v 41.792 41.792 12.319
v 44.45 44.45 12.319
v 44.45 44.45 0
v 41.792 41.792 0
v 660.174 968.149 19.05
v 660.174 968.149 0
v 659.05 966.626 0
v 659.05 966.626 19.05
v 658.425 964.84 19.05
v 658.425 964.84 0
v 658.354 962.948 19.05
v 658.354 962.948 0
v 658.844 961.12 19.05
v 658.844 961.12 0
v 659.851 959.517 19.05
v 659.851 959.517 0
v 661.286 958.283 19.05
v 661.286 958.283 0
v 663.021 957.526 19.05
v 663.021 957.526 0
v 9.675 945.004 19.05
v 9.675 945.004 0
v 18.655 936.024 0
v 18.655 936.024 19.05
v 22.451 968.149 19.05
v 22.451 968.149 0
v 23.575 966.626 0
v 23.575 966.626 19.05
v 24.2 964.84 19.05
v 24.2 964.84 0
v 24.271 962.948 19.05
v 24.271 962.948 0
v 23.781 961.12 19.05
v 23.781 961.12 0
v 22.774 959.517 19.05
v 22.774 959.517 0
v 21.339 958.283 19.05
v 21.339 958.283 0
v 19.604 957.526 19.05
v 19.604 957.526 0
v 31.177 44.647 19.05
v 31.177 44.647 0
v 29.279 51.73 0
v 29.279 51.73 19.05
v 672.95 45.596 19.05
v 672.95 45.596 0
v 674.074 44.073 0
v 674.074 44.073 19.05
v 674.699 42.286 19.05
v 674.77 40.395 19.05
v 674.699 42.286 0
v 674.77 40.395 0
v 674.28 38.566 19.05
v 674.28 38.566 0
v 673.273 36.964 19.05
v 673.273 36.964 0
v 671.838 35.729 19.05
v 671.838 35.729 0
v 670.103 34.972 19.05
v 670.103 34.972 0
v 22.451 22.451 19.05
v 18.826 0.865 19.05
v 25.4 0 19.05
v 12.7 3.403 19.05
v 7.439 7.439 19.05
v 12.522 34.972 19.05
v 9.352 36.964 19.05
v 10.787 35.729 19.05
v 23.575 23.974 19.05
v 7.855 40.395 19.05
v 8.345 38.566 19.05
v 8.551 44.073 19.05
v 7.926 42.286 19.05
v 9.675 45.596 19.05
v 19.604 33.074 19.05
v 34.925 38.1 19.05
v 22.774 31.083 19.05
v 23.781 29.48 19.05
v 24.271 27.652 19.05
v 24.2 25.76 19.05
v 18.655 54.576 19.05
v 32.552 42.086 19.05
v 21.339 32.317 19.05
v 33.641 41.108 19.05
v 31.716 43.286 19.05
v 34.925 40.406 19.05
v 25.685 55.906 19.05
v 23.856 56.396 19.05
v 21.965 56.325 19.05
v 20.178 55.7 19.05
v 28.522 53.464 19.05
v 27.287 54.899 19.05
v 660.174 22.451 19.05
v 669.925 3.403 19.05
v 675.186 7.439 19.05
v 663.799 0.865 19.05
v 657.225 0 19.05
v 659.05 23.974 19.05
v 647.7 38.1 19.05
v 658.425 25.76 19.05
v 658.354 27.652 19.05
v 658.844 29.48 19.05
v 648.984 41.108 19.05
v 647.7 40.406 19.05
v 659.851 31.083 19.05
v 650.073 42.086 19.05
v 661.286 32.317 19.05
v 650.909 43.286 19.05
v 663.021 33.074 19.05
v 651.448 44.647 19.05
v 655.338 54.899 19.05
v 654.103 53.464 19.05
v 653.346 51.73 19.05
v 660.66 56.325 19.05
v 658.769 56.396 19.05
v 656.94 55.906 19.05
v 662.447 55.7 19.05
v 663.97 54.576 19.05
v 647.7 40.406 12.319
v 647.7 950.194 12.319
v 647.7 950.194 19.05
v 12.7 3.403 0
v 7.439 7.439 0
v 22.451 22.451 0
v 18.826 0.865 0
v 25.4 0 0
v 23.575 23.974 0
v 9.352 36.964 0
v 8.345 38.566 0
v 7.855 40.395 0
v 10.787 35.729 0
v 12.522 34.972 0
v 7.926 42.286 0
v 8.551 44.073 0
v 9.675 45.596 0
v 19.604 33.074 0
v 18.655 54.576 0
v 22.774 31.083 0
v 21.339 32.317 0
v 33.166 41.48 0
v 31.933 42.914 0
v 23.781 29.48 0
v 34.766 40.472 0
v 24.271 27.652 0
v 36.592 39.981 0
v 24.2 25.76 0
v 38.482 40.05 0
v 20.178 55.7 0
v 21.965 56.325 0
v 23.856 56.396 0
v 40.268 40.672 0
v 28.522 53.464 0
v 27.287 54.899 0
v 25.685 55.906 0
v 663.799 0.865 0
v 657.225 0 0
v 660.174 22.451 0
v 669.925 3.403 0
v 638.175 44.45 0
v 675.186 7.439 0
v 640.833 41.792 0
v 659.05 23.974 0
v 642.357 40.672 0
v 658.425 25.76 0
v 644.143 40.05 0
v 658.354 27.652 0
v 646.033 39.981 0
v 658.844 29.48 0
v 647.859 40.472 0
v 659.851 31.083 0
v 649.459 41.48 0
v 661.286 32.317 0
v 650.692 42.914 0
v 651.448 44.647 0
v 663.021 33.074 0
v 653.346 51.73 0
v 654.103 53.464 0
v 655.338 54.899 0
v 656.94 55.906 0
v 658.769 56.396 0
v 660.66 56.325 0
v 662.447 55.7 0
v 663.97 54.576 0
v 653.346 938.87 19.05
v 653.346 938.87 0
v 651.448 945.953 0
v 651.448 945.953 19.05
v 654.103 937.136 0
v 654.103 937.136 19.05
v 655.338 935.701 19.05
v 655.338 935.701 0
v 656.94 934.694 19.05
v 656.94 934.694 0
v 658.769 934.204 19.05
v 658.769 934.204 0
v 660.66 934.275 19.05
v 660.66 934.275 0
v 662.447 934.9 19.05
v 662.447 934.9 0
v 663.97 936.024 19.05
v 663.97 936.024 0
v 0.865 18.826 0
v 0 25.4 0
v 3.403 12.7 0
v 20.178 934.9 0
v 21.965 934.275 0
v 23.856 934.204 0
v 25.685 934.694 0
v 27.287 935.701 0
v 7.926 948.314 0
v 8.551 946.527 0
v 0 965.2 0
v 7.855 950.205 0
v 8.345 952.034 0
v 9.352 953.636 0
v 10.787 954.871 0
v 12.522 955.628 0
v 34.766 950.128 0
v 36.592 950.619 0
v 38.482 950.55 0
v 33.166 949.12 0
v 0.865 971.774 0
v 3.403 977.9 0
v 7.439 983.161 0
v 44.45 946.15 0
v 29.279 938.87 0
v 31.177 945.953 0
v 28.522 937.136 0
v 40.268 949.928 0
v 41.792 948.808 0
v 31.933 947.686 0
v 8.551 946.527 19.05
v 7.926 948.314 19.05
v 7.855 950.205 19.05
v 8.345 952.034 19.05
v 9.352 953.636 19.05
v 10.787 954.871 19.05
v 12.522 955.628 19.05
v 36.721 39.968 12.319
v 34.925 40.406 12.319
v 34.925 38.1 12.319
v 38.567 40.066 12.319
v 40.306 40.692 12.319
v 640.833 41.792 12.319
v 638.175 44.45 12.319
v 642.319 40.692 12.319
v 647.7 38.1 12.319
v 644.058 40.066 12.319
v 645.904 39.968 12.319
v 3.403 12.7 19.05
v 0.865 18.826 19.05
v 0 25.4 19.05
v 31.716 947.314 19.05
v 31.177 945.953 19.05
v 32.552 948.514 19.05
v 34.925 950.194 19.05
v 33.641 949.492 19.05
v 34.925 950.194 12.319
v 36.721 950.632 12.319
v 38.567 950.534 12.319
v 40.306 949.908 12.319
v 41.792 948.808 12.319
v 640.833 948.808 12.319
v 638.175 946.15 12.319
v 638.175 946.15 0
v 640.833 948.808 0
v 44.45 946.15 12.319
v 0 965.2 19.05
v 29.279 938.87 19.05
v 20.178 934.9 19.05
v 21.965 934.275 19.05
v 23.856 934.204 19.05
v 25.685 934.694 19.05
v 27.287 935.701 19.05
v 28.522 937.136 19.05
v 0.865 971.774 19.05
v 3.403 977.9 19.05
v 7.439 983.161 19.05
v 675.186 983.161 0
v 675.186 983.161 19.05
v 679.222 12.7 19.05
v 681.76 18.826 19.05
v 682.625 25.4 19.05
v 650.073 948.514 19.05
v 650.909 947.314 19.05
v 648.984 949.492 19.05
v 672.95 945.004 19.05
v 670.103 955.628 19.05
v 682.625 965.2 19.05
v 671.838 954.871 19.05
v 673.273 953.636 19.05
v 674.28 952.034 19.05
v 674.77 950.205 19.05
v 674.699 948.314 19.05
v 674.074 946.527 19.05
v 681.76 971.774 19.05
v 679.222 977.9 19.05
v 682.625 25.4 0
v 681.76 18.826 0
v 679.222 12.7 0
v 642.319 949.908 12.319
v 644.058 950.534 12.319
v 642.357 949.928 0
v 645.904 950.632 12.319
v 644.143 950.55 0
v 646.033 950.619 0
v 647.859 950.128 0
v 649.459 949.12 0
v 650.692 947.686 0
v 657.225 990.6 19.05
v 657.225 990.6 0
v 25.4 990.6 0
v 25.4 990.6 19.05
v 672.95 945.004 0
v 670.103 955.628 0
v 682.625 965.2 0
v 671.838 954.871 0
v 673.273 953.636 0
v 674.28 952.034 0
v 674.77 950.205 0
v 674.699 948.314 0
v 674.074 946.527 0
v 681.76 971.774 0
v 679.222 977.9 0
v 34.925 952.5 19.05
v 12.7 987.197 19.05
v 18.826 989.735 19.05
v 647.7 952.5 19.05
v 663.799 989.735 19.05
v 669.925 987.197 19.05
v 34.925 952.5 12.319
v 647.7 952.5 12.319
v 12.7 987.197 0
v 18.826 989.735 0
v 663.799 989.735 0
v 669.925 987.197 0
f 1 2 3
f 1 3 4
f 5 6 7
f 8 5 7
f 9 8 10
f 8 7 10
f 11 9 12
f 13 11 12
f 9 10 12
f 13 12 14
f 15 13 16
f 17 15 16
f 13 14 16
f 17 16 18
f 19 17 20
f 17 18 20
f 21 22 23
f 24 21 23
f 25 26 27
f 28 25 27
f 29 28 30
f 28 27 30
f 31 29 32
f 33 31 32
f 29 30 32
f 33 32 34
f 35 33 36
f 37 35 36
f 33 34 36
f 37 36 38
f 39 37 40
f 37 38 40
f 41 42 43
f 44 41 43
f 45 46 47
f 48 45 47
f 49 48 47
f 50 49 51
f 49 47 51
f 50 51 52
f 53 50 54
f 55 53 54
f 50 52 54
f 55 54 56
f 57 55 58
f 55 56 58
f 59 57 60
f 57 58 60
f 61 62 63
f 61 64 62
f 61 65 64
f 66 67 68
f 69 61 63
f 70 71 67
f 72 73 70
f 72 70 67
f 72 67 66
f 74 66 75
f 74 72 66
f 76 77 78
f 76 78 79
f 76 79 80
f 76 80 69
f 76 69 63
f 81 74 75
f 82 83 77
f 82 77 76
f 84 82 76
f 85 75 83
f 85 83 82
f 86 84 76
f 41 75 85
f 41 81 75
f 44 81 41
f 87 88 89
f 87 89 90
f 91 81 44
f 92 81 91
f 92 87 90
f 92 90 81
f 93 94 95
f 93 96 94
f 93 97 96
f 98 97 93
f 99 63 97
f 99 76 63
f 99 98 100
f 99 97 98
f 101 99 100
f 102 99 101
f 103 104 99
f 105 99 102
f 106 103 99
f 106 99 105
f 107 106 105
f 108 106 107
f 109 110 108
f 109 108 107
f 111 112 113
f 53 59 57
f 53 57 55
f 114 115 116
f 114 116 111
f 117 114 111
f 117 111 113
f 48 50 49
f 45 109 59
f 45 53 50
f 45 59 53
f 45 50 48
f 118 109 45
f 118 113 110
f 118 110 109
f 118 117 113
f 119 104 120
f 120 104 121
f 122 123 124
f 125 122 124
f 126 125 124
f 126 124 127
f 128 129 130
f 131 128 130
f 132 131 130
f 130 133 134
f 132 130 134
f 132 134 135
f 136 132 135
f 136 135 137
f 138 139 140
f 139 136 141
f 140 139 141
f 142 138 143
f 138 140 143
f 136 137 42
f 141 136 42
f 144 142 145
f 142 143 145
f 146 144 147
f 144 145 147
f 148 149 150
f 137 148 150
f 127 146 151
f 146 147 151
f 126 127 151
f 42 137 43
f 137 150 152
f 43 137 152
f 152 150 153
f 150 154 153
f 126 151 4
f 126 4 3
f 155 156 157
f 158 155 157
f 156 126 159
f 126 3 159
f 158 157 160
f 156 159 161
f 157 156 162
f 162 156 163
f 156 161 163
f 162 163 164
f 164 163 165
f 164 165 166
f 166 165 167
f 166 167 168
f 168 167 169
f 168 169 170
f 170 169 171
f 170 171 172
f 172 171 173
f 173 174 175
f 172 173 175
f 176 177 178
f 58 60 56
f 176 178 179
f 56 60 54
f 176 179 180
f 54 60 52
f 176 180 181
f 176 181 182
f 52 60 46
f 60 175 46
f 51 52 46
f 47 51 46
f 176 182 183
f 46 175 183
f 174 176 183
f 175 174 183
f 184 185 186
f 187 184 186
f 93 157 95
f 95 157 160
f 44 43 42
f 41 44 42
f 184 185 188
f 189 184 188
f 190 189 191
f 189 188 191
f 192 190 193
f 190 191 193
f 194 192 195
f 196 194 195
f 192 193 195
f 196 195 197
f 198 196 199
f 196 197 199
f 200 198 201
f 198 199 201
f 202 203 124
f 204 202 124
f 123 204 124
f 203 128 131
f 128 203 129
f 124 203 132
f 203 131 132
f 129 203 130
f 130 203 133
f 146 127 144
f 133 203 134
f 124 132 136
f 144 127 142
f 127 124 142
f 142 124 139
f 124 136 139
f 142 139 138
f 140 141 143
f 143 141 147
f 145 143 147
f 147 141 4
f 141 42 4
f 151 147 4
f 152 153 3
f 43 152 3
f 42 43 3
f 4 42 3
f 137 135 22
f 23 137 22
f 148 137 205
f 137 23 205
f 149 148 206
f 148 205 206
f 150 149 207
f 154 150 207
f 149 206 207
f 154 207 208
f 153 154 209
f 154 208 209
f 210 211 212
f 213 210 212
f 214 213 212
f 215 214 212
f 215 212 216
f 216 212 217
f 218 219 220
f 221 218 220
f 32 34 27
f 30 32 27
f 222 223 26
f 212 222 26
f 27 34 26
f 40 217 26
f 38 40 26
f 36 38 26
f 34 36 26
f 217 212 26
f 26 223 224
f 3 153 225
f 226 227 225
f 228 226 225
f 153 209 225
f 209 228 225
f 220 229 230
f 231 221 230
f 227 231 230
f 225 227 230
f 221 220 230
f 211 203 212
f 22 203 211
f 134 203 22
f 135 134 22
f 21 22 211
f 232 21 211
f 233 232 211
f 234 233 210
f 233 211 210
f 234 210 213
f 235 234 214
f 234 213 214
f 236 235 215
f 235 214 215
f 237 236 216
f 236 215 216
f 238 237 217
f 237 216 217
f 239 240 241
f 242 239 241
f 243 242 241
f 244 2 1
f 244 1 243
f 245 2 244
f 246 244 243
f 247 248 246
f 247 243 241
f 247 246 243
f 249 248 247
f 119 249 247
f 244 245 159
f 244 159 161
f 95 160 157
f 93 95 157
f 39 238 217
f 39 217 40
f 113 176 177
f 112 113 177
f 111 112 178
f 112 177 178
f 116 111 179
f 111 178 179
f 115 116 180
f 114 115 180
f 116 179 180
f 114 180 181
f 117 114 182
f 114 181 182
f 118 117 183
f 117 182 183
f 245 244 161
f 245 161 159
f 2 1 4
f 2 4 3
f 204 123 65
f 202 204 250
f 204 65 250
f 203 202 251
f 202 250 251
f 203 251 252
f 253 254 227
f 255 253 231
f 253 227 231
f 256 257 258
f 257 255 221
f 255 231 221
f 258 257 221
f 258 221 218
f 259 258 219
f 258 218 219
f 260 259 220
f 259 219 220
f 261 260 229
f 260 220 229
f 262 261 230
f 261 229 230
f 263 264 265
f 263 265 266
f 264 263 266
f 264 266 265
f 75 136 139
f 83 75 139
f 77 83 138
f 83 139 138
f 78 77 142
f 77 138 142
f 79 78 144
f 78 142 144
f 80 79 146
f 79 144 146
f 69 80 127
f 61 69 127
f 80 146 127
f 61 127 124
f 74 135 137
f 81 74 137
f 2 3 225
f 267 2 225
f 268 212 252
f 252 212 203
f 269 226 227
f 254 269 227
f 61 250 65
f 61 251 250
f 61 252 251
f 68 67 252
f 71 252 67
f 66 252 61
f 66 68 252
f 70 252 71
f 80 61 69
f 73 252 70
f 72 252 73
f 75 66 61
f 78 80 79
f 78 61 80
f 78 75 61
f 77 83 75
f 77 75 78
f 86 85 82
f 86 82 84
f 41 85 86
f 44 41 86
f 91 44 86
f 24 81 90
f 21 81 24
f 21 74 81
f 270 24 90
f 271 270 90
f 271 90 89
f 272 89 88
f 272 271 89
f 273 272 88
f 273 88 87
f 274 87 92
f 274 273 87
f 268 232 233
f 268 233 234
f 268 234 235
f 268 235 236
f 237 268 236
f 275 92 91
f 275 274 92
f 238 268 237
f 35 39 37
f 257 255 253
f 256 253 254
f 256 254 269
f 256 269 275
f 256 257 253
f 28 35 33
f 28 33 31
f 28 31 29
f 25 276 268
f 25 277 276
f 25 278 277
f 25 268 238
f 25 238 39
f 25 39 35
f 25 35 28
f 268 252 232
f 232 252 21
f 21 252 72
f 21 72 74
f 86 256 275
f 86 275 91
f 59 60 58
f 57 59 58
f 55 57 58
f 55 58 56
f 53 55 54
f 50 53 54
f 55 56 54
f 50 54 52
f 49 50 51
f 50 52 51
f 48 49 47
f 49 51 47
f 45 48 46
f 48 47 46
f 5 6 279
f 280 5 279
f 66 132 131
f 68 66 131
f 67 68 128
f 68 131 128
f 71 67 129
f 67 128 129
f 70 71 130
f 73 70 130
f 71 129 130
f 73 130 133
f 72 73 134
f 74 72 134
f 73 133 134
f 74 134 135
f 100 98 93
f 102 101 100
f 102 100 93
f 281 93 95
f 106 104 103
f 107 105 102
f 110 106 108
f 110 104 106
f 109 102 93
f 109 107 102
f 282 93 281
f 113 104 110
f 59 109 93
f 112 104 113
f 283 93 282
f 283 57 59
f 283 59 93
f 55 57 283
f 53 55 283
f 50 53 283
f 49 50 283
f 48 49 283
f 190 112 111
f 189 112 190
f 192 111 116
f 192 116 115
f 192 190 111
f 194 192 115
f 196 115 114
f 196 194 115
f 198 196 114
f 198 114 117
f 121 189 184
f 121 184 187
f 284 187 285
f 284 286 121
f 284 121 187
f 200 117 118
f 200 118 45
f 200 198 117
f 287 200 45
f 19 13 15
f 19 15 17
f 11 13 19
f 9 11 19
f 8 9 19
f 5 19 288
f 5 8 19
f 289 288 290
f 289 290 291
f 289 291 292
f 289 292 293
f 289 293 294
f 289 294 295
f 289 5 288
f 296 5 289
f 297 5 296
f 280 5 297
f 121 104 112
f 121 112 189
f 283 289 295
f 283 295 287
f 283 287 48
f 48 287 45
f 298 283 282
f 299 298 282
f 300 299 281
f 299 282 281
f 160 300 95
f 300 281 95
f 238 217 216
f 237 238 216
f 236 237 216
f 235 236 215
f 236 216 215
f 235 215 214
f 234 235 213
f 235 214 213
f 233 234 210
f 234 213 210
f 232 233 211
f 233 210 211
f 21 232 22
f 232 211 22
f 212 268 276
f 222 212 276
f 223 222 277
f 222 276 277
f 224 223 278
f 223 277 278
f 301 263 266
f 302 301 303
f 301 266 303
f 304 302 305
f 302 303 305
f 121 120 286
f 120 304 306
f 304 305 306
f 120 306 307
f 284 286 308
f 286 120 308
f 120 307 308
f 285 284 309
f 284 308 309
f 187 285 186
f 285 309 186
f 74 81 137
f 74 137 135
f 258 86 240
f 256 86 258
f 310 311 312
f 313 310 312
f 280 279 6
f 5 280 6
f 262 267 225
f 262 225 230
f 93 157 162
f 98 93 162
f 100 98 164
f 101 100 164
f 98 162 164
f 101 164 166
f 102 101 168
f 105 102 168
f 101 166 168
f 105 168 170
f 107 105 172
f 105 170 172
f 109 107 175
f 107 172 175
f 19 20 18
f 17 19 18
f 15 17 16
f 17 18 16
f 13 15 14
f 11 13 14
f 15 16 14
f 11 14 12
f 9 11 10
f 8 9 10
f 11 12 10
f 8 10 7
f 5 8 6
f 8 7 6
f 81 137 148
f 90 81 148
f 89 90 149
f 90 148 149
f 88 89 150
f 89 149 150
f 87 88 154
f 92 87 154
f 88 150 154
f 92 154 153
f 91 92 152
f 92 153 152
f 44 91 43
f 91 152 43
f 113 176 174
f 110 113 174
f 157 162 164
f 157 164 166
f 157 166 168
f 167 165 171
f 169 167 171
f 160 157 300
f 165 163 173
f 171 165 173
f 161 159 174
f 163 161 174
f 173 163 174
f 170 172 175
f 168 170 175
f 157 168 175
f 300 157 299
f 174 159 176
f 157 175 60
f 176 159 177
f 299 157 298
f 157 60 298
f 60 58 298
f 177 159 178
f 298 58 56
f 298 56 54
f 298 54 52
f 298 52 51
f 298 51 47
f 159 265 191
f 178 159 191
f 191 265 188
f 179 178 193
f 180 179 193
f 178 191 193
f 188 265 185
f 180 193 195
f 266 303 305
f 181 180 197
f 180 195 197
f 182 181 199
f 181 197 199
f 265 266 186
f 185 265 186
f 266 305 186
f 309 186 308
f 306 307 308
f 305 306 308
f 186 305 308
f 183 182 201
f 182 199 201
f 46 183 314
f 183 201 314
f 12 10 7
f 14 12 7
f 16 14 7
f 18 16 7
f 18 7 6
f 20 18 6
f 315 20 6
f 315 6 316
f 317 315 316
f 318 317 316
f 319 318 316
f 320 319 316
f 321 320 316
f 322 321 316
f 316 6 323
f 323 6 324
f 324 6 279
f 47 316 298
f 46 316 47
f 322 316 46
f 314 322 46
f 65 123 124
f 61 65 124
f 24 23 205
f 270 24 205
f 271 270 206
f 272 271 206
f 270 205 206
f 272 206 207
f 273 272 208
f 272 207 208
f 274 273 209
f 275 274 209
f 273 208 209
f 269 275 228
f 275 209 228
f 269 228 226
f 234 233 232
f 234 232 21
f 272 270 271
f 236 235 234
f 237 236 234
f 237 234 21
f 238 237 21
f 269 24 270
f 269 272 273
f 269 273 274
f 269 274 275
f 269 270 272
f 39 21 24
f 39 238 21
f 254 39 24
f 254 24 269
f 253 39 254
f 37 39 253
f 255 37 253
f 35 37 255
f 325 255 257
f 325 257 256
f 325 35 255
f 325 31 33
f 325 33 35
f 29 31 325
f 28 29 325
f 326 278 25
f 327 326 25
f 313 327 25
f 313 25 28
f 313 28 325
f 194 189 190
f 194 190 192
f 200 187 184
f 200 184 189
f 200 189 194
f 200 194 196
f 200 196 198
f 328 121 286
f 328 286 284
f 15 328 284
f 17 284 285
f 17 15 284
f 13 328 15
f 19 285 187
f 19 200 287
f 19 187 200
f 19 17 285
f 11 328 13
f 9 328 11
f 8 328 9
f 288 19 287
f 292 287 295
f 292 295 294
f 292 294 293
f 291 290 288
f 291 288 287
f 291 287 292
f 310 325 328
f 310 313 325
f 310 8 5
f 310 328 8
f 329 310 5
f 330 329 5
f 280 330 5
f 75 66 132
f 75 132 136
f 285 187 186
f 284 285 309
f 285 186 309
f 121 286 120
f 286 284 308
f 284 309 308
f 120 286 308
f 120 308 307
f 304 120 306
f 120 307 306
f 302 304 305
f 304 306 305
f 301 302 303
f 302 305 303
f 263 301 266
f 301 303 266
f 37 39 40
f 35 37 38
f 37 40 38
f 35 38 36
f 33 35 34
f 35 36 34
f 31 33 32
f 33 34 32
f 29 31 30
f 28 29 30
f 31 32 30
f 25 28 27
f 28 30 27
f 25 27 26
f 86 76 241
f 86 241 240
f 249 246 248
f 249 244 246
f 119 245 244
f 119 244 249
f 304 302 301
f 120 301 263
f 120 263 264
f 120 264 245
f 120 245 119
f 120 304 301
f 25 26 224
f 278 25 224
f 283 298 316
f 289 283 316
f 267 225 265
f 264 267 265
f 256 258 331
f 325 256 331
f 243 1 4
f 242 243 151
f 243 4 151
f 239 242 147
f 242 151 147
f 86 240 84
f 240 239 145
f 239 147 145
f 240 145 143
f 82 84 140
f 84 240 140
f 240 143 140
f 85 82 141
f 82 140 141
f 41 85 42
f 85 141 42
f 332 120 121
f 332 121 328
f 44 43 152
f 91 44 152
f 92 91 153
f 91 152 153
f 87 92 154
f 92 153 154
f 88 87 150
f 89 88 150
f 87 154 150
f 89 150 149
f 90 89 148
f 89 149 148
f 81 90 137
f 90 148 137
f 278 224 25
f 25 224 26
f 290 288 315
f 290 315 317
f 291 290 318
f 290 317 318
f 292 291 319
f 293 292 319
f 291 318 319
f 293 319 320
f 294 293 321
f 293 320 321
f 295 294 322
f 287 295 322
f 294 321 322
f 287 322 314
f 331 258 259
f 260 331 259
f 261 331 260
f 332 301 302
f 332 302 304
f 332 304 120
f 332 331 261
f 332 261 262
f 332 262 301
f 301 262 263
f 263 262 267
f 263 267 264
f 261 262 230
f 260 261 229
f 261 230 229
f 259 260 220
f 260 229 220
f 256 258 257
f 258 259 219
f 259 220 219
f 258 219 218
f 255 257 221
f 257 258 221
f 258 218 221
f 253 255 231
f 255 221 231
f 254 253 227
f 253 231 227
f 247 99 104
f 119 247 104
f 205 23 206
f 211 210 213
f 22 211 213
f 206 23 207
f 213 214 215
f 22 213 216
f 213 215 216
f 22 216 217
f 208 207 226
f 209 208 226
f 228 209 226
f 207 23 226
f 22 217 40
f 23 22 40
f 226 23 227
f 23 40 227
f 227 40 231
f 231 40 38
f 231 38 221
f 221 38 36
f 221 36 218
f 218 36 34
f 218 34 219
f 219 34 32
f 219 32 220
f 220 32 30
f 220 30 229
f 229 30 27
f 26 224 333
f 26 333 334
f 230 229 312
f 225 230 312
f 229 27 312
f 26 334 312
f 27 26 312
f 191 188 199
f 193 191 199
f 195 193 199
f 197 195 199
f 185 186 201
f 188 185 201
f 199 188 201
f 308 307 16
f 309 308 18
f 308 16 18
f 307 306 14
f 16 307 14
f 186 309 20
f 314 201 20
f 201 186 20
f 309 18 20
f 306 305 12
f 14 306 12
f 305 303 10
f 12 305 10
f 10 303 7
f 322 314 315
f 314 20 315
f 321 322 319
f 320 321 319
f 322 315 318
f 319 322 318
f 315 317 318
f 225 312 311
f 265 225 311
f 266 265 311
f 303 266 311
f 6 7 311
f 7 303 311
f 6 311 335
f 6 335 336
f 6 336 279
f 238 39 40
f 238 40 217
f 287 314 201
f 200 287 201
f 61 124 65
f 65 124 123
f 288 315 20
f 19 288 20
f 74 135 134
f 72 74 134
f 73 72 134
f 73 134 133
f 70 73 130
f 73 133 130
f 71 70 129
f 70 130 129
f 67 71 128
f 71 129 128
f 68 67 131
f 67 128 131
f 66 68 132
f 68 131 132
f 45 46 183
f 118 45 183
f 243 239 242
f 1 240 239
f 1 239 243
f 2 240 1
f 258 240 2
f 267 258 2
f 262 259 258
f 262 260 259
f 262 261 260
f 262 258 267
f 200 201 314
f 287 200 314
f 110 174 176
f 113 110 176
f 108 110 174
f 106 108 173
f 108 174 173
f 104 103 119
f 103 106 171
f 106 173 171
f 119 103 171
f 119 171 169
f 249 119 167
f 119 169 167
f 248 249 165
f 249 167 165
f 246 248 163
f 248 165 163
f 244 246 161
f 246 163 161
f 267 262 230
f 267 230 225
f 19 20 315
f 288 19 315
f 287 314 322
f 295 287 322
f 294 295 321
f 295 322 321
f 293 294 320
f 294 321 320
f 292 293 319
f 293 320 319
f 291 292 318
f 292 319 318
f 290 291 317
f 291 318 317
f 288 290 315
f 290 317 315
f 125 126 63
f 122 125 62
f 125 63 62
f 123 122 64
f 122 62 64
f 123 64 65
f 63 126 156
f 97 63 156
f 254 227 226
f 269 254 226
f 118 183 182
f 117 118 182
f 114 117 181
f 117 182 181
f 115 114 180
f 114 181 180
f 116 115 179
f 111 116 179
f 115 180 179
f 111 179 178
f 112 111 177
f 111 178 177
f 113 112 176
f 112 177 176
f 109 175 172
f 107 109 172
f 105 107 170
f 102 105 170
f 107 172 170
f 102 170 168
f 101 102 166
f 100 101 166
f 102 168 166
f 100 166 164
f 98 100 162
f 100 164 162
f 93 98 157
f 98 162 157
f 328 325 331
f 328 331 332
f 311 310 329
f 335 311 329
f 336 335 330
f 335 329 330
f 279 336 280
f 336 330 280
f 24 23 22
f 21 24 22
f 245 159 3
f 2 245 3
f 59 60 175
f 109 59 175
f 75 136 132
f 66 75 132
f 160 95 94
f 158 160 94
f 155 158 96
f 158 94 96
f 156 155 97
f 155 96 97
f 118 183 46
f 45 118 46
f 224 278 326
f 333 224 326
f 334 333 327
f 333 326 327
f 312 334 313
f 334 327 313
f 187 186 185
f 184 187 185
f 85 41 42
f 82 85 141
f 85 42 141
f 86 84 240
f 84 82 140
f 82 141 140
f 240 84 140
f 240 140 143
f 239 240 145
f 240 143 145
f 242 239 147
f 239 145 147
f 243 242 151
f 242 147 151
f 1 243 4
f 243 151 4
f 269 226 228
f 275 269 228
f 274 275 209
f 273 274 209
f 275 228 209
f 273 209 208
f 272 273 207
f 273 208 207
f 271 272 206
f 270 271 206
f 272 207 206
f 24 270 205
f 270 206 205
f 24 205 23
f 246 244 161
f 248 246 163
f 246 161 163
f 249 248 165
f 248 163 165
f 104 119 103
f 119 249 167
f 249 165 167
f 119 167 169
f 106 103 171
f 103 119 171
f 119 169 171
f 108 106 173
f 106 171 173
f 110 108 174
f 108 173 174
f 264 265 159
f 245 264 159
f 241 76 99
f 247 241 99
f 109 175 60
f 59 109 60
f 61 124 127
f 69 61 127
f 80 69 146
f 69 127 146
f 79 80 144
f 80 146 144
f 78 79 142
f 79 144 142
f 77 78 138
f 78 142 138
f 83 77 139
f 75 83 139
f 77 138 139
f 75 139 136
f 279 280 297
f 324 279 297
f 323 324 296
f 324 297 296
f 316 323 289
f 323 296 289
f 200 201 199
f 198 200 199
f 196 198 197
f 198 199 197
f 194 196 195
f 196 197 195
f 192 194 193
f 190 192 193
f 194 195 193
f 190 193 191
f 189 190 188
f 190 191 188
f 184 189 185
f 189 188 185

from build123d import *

# Parameters (mm, degrees)
F1_DEPTH = 19.05
F3_DEPTH = 19.05
F4_W     = 612.775
F4_H     = 914.4
F5_DEPTH = 6.731
F6_W     = 1157.532364
F6_H     = 1425.050989
F7_DEPTH = 25.4


with BuildPart() as f1:
    # F0 (on Top) → F1 (new body)
    with BuildSketch(Plane.XY):
        with BuildLine():
            Line((22.45064, 22.45064), (0, 0))
            Line((0, 0), (682.625, 0))
            Line((682.625, 0), (660.17436, 22.45064))
            ThreePointArc((660.17436, 22.45064), (658.530859, 28.584269), (663.020987, 33.074397))
            Line((663.020987, 33.074397), (670.103492, 34.972149))
            ThreePointArc((670.103492, 34.972149), (674.59362, 39.462277), (672.950119, 45.595906))
            Line((672.950119, 45.595906), (663.969863, 54.576162))
            ThreePointArc((663.969863, 54.576162), (657.836234, 56.219663), (653.346105, 51.729535))
            Line((653.346105, 51.729535), (651.448351, 44.647017))
            ThreePointArc((651.448351, 44.647017), (646.964064, 40.158458), (640.833156, 41.791844))
            Line((640.833156, 41.791844), (638.175, 44.45))
            Line((638.175, 44.45), (44.45, 44.45))
            Line((44.45, 44.45), (41.791844, 41.791844))
            ThreePointArc((41.791844, 41.791844), (35.660936, 40.158458), (31.176649, 44.647017))
            Line((31.176649, 44.647017), (29.278895, 51.729535))
            ThreePointArc((29.278895, 51.729535), (24.788766, 56.219663), (18.655137, 54.576162))
            Line((18.655137, 54.576162), (9.674881, 45.595906))
            ThreePointArc((9.674881, 45.595906), (8.03138, 39.462277), (12.521508, 34.972149))
            Line((12.521508, 34.972149), (19.604013, 33.074397))
            ThreePointArc((19.604013, 33.074397), (24.094141, 28.584269), (22.45064, 22.45064))
        make_face()
        with BuildLine():
            Line((29.278895, 938.870465), (31.176649, 945.952983))
            ThreePointArc((31.176649, 945.952983), (35.660936, 950.441542), (41.791844, 948.808156))
            Line((41.791844, 948.808156), (44.45, 946.15))
            Line((44.45, 946.15), (638.175, 946.15))
            Line((638.175, 946.15), (640.833156, 948.808156))
            ThreePointArc((640.833156, 948.808156), (646.964064, 950.441542), (651.448351, 945.952983))
            Line((651.448351, 945.952983), (653.346105, 938.870465))
            ThreePointArc((653.346105, 938.870465), (657.836234, 934.380337), (663.969863, 936.023838))
            Line((663.969863, 936.023838), (672.950119, 945.004094))
            ThreePointArc((672.950119, 945.004094), (674.59362, 951.137723), (670.103492, 955.627851))
            Line((670.103492, 955.627851), (663.020987, 957.525603))
            ThreePointArc((663.020987, 957.525603), (658.530859, 962.015731), (660.17436, 968.14936))
            Line((660.17436, 968.14936), (682.625, 990.6))
            Line((682.625, 990.6), (0, 990.6))
            Line((0, 990.6), (22.45064, 968.14936))
            ThreePointArc((22.45064, 968.14936), (24.094141, 962.015731), (19.604013, 957.525603))
            Line((19.604013, 957.525603), (12.521508, 955.627851))
            ThreePointArc((12.521508, 955.627851), (8.03138, 951.137723), (9.674881, 945.004094))
            Line((9.674881, 945.004094), (18.655137, 936.023838))
            ThreePointArc((18.655137, 936.023838), (24.788766, 934.380337), (29.278895, 938.870465))
        make_face()
    extrude(amount=F1_DEPTH)


with BuildPart() as f3:
    # F2 (on Top) → F3 (new body)
    with BuildSketch(Plane.XY):
        with BuildLine():
            Line((0, 990.6), (0, 0))
            Line((0, 0), (22.45064, 22.45064))
            ThreePointArc((22.45064, 22.45064), (24.094141, 28.584269), (19.604013, 33.074397))
            Line((19.604013, 33.074397), (12.521508, 34.972149))
            ThreePointArc((12.521508, 34.972149), (8.03138, 39.462277), (9.674881, 45.595906))
            Line((9.674881, 45.595906), (18.655137, 54.576162))
            ThreePointArc((18.655137, 54.576162), (24.788766, 56.219663), (29.278895, 51.729535))
            Line((29.278895, 51.729535), (31.176649, 44.647017))
            ThreePointArc((31.176649, 44.647017), (35.660936, 40.158458), (41.791844, 41.791844))
            Line((41.791844, 41.791844), (44.45, 44.45))
            Line((44.45, 44.45), (44.45, 946.15))
            Line((44.45, 946.15), (41.791844, 948.808156))
            ThreePointArc((41.791844, 948.808156), (35.660936, 950.441542), (31.176649, 945.952983))
            Line((31.176649, 945.952983), (29.278895, 938.870465))
            ThreePointArc((29.278895, 938.870465), (24.788766, 934.380337), (18.655137, 936.023838))
            Line((18.655137, 936.023838), (9.674881, 945.004094))
            ThreePointArc((9.674881, 945.004094), (8.03138, 951.137723), (12.521508, 955.627851))
            Line((12.521508, 955.627851), (19.604013, 957.525603))
            ThreePointArc((19.604013, 957.525603), (24.094141, 962.015731), (22.45064, 968.14936))
            Line((22.45064, 968.14936), (0, 990.6))
        make_face()
        with BuildLine():
            Line((653.346105, 938.870465), (651.448351, 945.952983))
            ThreePointArc((651.448351, 945.952983), (646.964064, 950.441542), (640.833156, 948.808156))
            Line((640.833156, 948.808156), (638.175, 946.15))
            Line((638.175, 946.15), (638.175, 44.45))
            Line((638.175, 44.45), (640.833156, 41.791844))
            ThreePointArc((640.833156, 41.791844), (646.964064, 40.158458), (651.448351, 44.647017))
            Line((651.448351, 44.647017), (653.346105, 51.729535))
            ThreePointArc((653.346105, 51.729535), (657.836234, 56.219663), (663.969863, 54.576162))
            Line((663.969863, 54.576162), (672.950119, 45.595906))
            ThreePointArc((672.950119, 45.595906), (674.59362, 39.462277), (670.103492, 34.972149))
            Line((670.103492, 34.972149), (663.020987, 33.074397))
            ThreePointArc((663.020987, 33.074397), (658.530859, 28.584269), (660.17436, 22.45064))
            Line((660.17436, 22.45064), (682.625, 0))
            Line((682.625, 0), (682.625, 990.6))
            Line((682.625, 990.6), (660.17436, 968.14936))
            ThreePointArc((660.17436, 968.14936), (658.530859, 962.015731), (663.020987, 957.525603))
            Line((663.020987, 957.525603), (670.103492, 955.627851))
            ThreePointArc((670.103492, 955.627851), (674.59362, 951.137723), (672.950119, 945.004094))
            Line((672.950119, 945.004094), (663.969863, 936.023838))
            ThreePointArc((663.969863, 936.023838), (657.836234, 934.380337), (653.346105, 938.870465))
        make_face()
    extrude(amount=F3_DEPTH)


with BuildPart() as f5_tool:
    # F4 (on face) → F5 (new body)
    with BuildSketch(Plane.XY.offset(19.05)):
        with Locations((341.3125, 495.3)):
            Rectangle(F4_W, F4_H)
    extrude(amount=-F5_DEPTH)


with BuildPart() as f1_1:
    add(f1.part)

    # F5: cut by f5_tool
    add(f5_tool.part, mode=Mode.SUBTRACT)


with BuildPart() as f3_1:
    add(f3.part)

    # F5: cut by f5_tool
    add(f5_tool.part, mode=Mode.SUBTRACT)


with BuildPart() as f7_tool:
    # F6 (on face) → F7 (new body)
    with BuildSketch(Plane.XY.offset(19.05)):
        with Locations((321.719572, 495.283834)):
            Rectangle(F6_W, F6_H)
        with BuildLine():
            ThreePointArc((25.4, 0), (7.439488, 7.439488), (0, 25.4))
            Line((0, 25.4), (0, 965.2))
            ThreePointArc((0, 965.2), (7.439488, 983.160512), (25.4, 990.6))
            Line((25.4, 990.6), (657.225, 990.6))
            ThreePointArc((657.225, 990.6), (675.185512, 983.160512), (682.625, 965.2))
            Line((682.625, 965.2), (682.625, 25.4))
            ThreePointArc((682.625, 25.4), (675.185512, 7.439488), (657.225, 0))
            Line((657.225, 0), (25.4, 0))
        make_face(mode=Mode.SUBTRACT)
    extrude(amount=-F7_DEPTH)


with BuildPart() as f1_2:
    add(f1_1.part)

    # F7: cut by f7_tool
    add(f7_tool.part, mode=Mode.SUBTRACT)


with BuildPart() as f3_2:
    add(f3_1.part)

    # F7: cut by f7_tool
    add(f7_tool.part, mode=Mode.SUBTRACT)


solid = Compound([f1_2.part, f3_2.part])
